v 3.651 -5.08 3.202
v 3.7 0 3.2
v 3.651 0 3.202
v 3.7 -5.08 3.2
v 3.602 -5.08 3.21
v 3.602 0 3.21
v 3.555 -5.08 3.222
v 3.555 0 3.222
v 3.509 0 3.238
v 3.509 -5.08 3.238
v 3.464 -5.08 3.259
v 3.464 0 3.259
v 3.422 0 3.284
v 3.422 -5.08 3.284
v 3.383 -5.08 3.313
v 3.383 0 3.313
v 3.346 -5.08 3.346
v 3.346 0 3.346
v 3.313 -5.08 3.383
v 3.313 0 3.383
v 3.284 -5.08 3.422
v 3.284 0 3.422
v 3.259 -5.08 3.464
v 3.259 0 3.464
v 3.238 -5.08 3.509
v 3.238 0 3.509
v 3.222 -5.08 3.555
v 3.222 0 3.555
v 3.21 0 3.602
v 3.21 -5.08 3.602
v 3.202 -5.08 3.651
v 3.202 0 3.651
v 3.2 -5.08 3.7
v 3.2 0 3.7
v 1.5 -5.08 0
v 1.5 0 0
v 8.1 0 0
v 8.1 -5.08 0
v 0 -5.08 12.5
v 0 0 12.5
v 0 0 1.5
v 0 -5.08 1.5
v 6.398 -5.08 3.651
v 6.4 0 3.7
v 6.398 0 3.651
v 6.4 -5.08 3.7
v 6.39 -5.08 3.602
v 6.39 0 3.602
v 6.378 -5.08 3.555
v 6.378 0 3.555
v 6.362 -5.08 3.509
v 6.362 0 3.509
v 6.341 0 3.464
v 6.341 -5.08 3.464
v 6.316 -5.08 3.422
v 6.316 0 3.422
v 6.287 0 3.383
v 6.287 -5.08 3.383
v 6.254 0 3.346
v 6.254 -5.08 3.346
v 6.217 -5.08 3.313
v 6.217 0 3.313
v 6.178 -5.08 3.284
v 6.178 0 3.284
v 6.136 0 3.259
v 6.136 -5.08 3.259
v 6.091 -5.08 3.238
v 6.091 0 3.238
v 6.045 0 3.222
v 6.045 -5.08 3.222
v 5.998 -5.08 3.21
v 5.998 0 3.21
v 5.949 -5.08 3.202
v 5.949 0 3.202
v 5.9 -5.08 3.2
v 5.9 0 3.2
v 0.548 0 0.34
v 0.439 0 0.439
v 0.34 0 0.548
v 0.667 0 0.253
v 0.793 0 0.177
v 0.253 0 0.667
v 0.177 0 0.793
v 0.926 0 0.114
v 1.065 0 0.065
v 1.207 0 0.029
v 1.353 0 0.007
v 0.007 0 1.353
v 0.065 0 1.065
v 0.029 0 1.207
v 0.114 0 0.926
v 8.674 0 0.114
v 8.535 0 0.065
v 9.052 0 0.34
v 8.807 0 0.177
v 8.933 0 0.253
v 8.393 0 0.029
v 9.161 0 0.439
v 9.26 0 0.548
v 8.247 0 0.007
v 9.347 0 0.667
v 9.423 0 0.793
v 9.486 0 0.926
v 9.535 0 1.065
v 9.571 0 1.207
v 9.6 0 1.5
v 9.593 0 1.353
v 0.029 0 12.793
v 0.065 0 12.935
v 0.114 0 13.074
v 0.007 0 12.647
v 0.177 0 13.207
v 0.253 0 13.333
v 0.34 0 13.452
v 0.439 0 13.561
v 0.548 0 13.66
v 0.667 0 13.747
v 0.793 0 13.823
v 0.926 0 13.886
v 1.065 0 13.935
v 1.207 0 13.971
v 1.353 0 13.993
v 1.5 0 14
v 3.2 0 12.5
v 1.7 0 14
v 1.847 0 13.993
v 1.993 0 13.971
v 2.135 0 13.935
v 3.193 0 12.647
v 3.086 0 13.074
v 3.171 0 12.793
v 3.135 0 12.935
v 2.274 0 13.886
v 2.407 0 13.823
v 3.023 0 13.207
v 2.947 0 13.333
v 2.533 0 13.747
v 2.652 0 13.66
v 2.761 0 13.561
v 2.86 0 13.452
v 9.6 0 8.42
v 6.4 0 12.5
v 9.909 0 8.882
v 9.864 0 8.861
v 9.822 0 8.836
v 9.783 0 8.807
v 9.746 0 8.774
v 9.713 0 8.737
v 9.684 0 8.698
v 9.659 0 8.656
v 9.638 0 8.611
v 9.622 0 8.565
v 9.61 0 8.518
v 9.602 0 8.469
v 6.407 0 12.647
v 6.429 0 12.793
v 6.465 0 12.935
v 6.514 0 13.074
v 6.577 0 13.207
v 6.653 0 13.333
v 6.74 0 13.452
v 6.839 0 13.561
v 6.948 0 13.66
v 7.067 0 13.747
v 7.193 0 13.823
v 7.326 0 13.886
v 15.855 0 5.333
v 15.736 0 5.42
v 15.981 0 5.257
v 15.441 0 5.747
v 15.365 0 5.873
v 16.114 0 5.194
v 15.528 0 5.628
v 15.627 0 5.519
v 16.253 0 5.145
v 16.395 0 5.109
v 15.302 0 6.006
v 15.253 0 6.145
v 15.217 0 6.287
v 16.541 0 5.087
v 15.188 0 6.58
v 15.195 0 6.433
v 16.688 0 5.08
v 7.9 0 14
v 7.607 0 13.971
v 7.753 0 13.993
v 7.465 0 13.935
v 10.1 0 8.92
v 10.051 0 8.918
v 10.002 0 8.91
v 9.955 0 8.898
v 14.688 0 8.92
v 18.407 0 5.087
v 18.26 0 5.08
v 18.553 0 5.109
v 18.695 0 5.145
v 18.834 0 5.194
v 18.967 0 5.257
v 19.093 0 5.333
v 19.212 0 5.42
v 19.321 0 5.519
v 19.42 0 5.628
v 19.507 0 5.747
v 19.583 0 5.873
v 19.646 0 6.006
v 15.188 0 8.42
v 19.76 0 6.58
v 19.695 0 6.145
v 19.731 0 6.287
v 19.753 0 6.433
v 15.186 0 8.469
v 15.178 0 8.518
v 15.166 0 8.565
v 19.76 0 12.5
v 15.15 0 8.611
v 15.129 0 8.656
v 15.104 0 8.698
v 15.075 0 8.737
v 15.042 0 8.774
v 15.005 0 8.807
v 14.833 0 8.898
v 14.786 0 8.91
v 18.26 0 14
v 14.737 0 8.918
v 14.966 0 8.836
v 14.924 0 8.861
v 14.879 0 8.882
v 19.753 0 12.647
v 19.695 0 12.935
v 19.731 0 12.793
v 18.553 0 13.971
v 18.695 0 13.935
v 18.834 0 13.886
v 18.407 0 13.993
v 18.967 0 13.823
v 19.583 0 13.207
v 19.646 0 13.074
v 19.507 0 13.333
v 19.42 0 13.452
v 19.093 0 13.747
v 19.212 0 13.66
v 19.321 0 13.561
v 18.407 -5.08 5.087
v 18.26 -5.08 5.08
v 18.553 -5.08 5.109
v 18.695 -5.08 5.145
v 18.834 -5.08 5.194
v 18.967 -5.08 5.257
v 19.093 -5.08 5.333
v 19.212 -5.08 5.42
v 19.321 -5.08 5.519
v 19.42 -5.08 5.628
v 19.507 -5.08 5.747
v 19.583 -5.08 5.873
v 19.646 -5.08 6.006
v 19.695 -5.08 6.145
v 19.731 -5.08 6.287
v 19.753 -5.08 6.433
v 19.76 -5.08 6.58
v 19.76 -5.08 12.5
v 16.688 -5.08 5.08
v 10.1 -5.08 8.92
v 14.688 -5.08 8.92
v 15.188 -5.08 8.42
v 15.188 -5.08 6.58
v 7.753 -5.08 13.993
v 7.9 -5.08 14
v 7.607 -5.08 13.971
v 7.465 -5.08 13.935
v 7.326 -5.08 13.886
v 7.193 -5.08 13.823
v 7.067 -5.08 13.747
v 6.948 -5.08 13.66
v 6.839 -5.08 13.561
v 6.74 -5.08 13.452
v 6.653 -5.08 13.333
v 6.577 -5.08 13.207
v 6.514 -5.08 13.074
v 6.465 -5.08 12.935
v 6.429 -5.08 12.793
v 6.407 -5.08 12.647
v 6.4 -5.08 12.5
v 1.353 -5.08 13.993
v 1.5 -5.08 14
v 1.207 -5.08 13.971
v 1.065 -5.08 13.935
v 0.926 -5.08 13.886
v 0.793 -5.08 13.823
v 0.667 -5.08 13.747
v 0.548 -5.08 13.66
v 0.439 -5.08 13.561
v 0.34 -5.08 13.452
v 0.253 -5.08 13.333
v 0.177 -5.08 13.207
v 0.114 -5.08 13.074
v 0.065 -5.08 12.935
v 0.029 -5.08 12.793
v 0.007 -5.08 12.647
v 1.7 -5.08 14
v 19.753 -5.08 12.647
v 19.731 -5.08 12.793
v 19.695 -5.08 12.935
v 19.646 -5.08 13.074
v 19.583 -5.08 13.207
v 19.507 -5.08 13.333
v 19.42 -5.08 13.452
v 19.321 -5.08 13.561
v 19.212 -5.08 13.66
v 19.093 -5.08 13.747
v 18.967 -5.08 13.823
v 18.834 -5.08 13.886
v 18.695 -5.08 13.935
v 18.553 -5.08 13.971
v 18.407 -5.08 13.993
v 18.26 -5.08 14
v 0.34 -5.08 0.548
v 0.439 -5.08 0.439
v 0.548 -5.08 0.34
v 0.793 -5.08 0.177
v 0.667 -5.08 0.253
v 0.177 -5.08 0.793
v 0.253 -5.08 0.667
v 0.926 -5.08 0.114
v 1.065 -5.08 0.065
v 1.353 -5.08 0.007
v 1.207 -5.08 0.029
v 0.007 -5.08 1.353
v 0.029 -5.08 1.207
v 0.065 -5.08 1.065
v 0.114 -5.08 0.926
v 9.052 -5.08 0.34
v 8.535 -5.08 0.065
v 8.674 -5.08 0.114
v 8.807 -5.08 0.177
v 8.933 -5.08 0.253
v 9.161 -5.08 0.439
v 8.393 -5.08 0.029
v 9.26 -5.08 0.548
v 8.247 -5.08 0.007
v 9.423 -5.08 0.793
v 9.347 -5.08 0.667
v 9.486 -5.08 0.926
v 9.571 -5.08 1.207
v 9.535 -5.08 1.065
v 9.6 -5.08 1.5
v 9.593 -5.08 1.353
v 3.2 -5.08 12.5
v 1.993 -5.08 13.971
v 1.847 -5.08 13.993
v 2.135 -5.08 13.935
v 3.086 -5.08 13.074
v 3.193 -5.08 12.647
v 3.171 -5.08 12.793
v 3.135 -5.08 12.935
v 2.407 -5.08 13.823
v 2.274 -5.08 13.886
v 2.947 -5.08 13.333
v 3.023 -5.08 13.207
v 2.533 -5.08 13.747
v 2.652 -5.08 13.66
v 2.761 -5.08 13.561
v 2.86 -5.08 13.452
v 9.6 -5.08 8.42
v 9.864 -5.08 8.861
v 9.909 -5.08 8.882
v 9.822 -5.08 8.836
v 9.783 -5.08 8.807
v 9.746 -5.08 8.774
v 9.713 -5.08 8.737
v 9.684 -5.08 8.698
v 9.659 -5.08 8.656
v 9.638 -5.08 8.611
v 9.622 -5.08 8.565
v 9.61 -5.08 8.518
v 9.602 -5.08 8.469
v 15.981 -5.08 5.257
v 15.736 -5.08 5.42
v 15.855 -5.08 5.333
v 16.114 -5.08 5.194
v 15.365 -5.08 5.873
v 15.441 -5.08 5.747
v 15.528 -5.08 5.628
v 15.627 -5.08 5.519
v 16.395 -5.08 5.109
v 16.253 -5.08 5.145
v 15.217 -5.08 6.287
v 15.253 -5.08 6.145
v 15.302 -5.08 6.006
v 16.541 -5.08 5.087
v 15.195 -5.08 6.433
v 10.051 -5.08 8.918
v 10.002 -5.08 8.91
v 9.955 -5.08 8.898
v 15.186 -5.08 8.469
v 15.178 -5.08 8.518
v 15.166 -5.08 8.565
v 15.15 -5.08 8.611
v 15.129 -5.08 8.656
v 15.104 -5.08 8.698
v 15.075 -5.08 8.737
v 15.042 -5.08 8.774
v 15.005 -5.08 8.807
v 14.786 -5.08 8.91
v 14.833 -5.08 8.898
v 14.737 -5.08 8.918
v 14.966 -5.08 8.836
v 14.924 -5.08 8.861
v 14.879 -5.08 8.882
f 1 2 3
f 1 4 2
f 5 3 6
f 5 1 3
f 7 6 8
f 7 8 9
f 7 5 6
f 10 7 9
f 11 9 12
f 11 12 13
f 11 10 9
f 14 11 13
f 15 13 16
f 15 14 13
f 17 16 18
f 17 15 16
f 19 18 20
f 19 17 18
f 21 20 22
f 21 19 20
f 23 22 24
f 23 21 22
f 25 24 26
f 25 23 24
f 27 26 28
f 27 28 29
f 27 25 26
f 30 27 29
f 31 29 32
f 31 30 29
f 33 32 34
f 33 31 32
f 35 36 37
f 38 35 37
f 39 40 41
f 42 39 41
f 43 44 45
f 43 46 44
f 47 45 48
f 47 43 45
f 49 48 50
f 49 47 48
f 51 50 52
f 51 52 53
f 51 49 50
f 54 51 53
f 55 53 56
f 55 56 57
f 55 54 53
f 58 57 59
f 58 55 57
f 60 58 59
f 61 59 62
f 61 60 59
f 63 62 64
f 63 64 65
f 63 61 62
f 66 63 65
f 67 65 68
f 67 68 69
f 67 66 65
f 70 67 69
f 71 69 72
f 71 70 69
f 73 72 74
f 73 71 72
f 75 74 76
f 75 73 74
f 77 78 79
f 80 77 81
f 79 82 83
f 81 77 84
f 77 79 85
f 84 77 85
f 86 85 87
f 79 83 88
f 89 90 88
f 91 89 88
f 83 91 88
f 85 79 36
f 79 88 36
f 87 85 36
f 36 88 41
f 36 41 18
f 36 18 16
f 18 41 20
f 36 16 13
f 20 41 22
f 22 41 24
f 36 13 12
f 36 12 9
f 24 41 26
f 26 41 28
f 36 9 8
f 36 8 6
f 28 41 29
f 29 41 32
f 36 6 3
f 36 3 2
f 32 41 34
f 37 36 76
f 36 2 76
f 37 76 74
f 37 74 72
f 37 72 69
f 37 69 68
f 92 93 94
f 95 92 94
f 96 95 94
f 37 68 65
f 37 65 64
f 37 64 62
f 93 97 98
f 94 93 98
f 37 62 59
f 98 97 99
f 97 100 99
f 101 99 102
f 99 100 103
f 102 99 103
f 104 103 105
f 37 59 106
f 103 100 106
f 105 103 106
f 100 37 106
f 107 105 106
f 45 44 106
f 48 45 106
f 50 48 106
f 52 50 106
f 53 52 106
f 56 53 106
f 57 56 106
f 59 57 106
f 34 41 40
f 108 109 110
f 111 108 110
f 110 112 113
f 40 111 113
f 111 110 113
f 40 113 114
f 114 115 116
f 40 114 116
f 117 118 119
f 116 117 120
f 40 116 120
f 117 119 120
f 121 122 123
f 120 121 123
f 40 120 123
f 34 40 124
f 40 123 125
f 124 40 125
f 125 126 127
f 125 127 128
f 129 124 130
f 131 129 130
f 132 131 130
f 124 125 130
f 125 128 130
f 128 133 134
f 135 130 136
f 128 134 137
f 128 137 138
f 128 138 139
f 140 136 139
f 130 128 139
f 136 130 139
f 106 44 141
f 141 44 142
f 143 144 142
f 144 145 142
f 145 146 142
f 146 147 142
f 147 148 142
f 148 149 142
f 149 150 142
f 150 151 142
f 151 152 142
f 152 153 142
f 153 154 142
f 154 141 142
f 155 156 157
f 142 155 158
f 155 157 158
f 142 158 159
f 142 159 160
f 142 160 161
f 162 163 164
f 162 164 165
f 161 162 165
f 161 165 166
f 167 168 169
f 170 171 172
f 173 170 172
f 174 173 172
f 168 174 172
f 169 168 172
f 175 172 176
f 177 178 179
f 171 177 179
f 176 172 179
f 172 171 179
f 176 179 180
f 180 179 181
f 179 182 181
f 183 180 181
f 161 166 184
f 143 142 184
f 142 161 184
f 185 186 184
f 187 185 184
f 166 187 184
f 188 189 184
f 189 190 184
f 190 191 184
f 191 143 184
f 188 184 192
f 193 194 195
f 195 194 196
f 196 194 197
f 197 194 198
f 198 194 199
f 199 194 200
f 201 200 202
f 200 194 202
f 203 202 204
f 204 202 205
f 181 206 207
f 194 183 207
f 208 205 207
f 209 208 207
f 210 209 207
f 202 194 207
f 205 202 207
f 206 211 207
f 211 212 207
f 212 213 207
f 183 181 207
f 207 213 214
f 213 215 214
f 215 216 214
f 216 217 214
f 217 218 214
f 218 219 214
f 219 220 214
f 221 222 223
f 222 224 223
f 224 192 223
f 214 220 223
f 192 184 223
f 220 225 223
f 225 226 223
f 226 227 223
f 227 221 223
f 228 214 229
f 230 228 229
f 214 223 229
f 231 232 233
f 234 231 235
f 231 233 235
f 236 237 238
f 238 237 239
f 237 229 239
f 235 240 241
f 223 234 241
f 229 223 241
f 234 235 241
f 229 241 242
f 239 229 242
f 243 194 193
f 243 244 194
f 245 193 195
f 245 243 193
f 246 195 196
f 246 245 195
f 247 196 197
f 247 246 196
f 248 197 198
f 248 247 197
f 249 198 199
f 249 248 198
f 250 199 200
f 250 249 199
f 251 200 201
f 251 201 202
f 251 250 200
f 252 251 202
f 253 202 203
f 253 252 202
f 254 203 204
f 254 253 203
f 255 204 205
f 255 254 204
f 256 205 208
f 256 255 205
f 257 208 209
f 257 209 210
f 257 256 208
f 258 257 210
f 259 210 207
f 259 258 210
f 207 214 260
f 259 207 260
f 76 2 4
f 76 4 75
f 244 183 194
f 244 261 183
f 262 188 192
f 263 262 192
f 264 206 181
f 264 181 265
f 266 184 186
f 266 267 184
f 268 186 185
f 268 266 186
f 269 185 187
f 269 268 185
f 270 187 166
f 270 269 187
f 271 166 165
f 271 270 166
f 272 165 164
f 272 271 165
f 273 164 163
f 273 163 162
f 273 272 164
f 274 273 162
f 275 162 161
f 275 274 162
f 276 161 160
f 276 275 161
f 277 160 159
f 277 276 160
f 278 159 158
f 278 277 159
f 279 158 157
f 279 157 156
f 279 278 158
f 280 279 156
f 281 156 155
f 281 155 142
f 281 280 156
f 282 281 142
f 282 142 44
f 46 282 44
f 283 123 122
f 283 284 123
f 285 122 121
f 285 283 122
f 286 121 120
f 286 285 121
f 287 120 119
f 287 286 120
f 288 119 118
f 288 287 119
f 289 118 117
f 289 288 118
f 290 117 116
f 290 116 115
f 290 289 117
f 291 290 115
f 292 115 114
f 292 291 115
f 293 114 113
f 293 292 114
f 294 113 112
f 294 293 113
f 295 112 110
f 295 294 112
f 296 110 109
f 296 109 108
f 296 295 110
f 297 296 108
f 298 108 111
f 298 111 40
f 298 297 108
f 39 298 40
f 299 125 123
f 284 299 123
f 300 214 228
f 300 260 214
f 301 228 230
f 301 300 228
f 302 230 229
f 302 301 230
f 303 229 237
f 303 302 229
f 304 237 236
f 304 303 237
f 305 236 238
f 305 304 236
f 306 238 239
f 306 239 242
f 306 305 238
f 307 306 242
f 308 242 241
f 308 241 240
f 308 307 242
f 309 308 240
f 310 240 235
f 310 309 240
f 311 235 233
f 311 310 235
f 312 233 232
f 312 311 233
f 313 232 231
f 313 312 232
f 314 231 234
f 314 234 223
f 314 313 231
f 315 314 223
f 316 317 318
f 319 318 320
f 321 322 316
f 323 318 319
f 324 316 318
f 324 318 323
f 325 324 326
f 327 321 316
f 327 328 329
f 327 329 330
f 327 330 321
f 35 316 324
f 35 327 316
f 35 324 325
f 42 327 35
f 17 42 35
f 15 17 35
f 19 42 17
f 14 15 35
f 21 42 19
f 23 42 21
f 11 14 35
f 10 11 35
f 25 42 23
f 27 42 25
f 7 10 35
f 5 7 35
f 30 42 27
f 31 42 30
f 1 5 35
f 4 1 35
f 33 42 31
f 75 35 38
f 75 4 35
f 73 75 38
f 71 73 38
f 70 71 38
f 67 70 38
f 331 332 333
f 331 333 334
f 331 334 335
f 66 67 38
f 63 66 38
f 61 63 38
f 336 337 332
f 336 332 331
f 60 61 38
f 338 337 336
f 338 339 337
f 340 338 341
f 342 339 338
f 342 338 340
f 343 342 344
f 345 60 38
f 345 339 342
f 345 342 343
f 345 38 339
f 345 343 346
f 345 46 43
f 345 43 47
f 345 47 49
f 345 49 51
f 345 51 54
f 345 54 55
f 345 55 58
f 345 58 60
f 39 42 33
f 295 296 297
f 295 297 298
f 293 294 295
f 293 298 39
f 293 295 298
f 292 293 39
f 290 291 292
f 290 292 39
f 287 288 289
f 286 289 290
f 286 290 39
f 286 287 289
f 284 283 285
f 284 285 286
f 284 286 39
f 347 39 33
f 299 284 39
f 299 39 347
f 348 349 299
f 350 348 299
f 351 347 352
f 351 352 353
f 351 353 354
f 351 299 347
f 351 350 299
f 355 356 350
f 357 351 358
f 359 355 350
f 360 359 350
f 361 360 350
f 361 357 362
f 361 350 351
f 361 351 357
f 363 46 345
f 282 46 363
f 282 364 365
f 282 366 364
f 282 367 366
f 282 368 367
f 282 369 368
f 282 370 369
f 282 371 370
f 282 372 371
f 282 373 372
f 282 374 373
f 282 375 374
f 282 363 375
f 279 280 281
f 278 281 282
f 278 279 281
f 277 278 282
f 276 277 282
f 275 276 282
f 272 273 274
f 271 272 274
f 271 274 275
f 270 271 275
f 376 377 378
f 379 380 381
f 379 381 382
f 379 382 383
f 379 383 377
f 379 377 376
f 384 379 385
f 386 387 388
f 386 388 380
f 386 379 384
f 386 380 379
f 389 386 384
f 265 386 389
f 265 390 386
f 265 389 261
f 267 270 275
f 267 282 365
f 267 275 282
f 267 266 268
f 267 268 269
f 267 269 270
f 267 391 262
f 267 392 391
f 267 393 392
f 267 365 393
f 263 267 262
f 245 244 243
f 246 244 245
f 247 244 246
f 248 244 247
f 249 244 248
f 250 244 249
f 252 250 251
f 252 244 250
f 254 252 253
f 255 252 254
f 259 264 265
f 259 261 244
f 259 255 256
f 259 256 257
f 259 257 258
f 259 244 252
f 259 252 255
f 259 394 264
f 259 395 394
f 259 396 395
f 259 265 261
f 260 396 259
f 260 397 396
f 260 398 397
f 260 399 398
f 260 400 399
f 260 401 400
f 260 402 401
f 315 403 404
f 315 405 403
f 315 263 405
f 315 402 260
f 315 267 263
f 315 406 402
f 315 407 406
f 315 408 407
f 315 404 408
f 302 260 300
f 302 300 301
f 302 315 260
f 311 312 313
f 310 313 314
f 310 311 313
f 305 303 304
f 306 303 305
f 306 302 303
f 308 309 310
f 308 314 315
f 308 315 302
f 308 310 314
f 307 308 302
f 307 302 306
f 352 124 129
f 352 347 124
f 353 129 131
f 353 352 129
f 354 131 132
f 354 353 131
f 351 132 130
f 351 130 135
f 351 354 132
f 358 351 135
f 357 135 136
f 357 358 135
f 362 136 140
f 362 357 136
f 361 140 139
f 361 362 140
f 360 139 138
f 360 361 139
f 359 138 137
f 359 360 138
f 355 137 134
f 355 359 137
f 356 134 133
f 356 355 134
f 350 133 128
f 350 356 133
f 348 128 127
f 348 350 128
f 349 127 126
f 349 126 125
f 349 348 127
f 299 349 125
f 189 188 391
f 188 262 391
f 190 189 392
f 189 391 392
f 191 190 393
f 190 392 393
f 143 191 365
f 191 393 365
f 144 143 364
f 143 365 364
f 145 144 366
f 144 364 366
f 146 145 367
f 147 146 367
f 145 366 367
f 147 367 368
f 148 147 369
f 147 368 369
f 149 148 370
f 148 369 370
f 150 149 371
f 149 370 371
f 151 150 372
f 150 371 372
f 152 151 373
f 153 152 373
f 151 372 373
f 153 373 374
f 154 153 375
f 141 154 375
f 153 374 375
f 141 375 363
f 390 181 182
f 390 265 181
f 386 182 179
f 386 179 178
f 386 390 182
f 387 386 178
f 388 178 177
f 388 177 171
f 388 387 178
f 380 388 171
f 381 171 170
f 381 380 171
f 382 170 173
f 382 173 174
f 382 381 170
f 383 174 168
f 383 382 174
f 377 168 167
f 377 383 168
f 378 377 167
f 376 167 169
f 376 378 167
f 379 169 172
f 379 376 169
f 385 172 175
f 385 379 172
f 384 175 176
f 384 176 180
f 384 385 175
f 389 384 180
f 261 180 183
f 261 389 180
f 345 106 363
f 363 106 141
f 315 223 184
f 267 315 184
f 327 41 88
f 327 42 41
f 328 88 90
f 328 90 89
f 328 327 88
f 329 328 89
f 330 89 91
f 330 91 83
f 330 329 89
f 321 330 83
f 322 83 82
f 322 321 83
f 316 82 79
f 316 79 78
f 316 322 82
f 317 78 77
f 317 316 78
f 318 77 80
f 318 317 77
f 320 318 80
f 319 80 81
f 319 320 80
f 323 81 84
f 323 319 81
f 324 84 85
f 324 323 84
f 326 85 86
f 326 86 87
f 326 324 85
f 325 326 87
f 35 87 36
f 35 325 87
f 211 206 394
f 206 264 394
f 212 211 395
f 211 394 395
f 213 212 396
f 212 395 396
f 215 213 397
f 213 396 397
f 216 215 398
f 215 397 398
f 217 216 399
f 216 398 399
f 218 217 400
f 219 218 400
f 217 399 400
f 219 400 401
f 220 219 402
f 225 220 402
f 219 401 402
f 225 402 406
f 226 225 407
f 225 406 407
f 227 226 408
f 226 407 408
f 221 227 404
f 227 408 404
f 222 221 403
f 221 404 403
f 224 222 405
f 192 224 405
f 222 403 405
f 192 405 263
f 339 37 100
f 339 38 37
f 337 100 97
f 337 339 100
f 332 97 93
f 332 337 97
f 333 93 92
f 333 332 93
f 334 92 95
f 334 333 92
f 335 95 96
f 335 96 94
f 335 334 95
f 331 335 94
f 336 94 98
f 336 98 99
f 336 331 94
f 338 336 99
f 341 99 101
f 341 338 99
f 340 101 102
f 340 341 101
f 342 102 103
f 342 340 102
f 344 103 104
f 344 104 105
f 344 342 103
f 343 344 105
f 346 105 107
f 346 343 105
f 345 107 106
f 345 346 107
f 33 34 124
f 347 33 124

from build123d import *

# Parameters (mm, degrees)
F0_W     = 10.16
F0_H     = 5.08
F0_W_2   = 3.2
F0_H_2   = 3.2
F1_DEPTH = 5.08
F2_W     = 4.572
F2_H     = 5.08
F3_DEPTH = 3.84
F4_R     = 1.5
F5_R     = 0.5


with BuildPart() as f1:
    # F0 (on Front) → F1 (new body)
    with BuildSketch(Plane.XZ):
        with Locations((14.68, 11.46)):
            Rectangle(F0_W, F0_H)
        with BuildLine():
            ThreePointArc((0, 1.27), (0.371974, 0.371974), (1.27, 0))
            Line((1.27, 0), (3.2, 0))
            Line((3.2, 0), (3.2, 3.2))
            Line((3.2, 3.2), (3.2, 10.8))
            Line((3.2, 10.8), (0, 10.8))
            Line((0, 10.8), (0, 1.27))
        make_face()
        with Locations((4.8, 1.6)):
            Rectangle(F0_W_2, F0_H_2)
        with BuildLine():
            Line((6.4, 3.2), (6.4, 0))
            Line((6.4, 0), (8.33, 0))
            ThreePointArc((8.33, 0), (9.228026, 0.371974), (9.6, 1.27))
            Line((9.6, 1.27), (9.6, 8.92))
            Line((9.6, 8.92), (9.6, 14))
            Line((9.6, 14), (6.4, 14))
            Line((6.4, 14), (6.4, 3.2))
        make_face()
        with BuildLine():
            Line((0, 0), (1.27, 0))
            ThreePointArc((1.27, 0), (0.371974, 0.371974), (0, 1.27))
            Line((0, 1.27), (0, 0))
        make_face()
        with BuildLine():
            ThreePointArc((9.6, 1.27), (9.228026, 0.371974), (8.33, 0))
            Line((8.33, 0), (9.6, 0))
            Line((9.6, 0), (9.6, 1.27))
        make_face()
        with BuildLine():
            Line((0, 12.73), (0, 10.8))
            Line((0, 10.8), (3.2, 10.8))
            Line((3.2, 10.8), (3.2, 14))
            Line((3.2, 14), (1.27, 14))
            ThreePointArc((1.27, 14), (0.371974, 13.628026), (0, 12.73))
        make_face()
        with BuildLine():
            Line((0, 14), (0, 12.73))
            ThreePointArc((0, 12.73), (0.371974, 13.628026), (1.27, 14))
            Line((1.27, 14), (0, 14))
        make_face()
    extrude(amount=F1_DEPTH)

    # F2 (on face) → F3 (join)
    with BuildSketch(Plane(origin=(0, 0, 8.92), x_dir=(1, 0, 0), z_dir=(0, 0, -1))):
        with Locations((17.474, 2.54)):
            Rectangle(F2_W, F2_H)
    extrude(amount=F3_DEPTH)

    # F4
    f4_edges = [f1.edges().sort_by_distance(p)[0] for p in [
        (0, -2.54, 0),
        (9.6, -2.54, 0),
        (0, -2.54, 14),
        (3.2, -2.54, 14),
        (6.4, -2.54, 14),
        (19.76, -2.54, 14),
        (19.76, -2.54, 5.08),
        (15.188, -2.54, 5.08),
    ]]
    fillet(f4_edges, radius=F4_R)

    # F5
    f5_edges = [f1.edges().sort_by_distance(p)[0] for p in [
        (6.4, -2.54, 3.2),
        (3.2, -2.54, 3.2),
        (15.188, -2.54, 8.92),
        (9.6, -2.54, 8.92),
    ]]
    fillet(f5_edges, radius=F5_R)


solid = f1.part
